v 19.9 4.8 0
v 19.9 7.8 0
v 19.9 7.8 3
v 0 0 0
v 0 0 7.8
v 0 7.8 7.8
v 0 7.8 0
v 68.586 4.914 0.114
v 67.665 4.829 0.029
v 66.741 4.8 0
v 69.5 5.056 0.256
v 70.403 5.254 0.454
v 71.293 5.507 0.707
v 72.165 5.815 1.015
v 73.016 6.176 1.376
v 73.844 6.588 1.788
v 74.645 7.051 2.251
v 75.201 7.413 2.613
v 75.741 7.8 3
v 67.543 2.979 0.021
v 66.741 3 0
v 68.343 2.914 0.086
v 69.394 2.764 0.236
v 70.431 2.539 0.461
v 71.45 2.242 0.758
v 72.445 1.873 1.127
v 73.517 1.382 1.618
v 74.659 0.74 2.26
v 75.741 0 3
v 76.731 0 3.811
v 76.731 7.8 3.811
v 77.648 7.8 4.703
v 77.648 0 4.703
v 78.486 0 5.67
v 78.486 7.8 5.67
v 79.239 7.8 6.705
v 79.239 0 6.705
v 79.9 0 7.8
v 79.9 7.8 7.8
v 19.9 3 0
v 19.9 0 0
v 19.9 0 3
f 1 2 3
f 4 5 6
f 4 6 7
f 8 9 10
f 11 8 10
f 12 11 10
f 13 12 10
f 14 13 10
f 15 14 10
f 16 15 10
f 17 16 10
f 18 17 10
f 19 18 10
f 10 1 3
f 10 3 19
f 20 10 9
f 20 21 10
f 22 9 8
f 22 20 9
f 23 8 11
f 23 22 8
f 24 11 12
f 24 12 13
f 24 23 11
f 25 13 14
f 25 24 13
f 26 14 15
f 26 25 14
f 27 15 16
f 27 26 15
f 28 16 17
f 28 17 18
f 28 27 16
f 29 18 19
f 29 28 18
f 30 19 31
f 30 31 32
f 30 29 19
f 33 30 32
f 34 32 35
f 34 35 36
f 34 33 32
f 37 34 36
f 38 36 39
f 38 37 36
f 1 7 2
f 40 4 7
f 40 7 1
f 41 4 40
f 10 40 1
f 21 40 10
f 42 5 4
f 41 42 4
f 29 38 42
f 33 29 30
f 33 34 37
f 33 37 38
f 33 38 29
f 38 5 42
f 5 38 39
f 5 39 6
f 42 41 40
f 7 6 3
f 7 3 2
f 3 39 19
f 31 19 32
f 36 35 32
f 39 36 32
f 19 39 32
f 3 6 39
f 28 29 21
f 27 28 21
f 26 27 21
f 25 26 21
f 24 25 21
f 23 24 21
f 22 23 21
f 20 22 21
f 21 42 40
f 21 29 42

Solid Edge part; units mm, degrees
sketch "Sketch1" plane through (0, 0, 0) normal (0, -1, 0) x (1, 0, 0)
  line L0 (0, 0) -> (19.9, 0)
  line L1 (19.9, 0) -> (19.9, 7.8)
  line L2 (19.9, 7.8) -> (0, 7.8)
  line L3 (0, 7.8) -> (0, 0)
  dimension "D1" = 7.8
  dimension "D2" = 19.9
extrude "Protrusion1" add sketch "Sketch1" against normal blind 7.8
sketch "Sketch2" plane through (19.9, 3.95, 3.95) normal (1, 0, 0) x (0, 1, 0)
  line L0 (3.85, 3.85) -> (-3.95, 3.85)
  line L1 (-3.95, 3.85) -> (-3.95, -0.95)
  line L2 (-3.95, -0.95) -> (-0.95, -3.95)
  line L3 (-0.95, -3.95) -> (0.85, -3.95)
  line L4 (0.85, -3.95) -> (3.85, -0.95)
  line L5 (3.85, -0.95) -> (3.85, 3.85)
extrude "ExtrudedProtrusion_2" add sketch "Sketch2" along normal blind 60
fillet "Round_1" radius 15 1 edges at (79.9, 3.9, 0)
